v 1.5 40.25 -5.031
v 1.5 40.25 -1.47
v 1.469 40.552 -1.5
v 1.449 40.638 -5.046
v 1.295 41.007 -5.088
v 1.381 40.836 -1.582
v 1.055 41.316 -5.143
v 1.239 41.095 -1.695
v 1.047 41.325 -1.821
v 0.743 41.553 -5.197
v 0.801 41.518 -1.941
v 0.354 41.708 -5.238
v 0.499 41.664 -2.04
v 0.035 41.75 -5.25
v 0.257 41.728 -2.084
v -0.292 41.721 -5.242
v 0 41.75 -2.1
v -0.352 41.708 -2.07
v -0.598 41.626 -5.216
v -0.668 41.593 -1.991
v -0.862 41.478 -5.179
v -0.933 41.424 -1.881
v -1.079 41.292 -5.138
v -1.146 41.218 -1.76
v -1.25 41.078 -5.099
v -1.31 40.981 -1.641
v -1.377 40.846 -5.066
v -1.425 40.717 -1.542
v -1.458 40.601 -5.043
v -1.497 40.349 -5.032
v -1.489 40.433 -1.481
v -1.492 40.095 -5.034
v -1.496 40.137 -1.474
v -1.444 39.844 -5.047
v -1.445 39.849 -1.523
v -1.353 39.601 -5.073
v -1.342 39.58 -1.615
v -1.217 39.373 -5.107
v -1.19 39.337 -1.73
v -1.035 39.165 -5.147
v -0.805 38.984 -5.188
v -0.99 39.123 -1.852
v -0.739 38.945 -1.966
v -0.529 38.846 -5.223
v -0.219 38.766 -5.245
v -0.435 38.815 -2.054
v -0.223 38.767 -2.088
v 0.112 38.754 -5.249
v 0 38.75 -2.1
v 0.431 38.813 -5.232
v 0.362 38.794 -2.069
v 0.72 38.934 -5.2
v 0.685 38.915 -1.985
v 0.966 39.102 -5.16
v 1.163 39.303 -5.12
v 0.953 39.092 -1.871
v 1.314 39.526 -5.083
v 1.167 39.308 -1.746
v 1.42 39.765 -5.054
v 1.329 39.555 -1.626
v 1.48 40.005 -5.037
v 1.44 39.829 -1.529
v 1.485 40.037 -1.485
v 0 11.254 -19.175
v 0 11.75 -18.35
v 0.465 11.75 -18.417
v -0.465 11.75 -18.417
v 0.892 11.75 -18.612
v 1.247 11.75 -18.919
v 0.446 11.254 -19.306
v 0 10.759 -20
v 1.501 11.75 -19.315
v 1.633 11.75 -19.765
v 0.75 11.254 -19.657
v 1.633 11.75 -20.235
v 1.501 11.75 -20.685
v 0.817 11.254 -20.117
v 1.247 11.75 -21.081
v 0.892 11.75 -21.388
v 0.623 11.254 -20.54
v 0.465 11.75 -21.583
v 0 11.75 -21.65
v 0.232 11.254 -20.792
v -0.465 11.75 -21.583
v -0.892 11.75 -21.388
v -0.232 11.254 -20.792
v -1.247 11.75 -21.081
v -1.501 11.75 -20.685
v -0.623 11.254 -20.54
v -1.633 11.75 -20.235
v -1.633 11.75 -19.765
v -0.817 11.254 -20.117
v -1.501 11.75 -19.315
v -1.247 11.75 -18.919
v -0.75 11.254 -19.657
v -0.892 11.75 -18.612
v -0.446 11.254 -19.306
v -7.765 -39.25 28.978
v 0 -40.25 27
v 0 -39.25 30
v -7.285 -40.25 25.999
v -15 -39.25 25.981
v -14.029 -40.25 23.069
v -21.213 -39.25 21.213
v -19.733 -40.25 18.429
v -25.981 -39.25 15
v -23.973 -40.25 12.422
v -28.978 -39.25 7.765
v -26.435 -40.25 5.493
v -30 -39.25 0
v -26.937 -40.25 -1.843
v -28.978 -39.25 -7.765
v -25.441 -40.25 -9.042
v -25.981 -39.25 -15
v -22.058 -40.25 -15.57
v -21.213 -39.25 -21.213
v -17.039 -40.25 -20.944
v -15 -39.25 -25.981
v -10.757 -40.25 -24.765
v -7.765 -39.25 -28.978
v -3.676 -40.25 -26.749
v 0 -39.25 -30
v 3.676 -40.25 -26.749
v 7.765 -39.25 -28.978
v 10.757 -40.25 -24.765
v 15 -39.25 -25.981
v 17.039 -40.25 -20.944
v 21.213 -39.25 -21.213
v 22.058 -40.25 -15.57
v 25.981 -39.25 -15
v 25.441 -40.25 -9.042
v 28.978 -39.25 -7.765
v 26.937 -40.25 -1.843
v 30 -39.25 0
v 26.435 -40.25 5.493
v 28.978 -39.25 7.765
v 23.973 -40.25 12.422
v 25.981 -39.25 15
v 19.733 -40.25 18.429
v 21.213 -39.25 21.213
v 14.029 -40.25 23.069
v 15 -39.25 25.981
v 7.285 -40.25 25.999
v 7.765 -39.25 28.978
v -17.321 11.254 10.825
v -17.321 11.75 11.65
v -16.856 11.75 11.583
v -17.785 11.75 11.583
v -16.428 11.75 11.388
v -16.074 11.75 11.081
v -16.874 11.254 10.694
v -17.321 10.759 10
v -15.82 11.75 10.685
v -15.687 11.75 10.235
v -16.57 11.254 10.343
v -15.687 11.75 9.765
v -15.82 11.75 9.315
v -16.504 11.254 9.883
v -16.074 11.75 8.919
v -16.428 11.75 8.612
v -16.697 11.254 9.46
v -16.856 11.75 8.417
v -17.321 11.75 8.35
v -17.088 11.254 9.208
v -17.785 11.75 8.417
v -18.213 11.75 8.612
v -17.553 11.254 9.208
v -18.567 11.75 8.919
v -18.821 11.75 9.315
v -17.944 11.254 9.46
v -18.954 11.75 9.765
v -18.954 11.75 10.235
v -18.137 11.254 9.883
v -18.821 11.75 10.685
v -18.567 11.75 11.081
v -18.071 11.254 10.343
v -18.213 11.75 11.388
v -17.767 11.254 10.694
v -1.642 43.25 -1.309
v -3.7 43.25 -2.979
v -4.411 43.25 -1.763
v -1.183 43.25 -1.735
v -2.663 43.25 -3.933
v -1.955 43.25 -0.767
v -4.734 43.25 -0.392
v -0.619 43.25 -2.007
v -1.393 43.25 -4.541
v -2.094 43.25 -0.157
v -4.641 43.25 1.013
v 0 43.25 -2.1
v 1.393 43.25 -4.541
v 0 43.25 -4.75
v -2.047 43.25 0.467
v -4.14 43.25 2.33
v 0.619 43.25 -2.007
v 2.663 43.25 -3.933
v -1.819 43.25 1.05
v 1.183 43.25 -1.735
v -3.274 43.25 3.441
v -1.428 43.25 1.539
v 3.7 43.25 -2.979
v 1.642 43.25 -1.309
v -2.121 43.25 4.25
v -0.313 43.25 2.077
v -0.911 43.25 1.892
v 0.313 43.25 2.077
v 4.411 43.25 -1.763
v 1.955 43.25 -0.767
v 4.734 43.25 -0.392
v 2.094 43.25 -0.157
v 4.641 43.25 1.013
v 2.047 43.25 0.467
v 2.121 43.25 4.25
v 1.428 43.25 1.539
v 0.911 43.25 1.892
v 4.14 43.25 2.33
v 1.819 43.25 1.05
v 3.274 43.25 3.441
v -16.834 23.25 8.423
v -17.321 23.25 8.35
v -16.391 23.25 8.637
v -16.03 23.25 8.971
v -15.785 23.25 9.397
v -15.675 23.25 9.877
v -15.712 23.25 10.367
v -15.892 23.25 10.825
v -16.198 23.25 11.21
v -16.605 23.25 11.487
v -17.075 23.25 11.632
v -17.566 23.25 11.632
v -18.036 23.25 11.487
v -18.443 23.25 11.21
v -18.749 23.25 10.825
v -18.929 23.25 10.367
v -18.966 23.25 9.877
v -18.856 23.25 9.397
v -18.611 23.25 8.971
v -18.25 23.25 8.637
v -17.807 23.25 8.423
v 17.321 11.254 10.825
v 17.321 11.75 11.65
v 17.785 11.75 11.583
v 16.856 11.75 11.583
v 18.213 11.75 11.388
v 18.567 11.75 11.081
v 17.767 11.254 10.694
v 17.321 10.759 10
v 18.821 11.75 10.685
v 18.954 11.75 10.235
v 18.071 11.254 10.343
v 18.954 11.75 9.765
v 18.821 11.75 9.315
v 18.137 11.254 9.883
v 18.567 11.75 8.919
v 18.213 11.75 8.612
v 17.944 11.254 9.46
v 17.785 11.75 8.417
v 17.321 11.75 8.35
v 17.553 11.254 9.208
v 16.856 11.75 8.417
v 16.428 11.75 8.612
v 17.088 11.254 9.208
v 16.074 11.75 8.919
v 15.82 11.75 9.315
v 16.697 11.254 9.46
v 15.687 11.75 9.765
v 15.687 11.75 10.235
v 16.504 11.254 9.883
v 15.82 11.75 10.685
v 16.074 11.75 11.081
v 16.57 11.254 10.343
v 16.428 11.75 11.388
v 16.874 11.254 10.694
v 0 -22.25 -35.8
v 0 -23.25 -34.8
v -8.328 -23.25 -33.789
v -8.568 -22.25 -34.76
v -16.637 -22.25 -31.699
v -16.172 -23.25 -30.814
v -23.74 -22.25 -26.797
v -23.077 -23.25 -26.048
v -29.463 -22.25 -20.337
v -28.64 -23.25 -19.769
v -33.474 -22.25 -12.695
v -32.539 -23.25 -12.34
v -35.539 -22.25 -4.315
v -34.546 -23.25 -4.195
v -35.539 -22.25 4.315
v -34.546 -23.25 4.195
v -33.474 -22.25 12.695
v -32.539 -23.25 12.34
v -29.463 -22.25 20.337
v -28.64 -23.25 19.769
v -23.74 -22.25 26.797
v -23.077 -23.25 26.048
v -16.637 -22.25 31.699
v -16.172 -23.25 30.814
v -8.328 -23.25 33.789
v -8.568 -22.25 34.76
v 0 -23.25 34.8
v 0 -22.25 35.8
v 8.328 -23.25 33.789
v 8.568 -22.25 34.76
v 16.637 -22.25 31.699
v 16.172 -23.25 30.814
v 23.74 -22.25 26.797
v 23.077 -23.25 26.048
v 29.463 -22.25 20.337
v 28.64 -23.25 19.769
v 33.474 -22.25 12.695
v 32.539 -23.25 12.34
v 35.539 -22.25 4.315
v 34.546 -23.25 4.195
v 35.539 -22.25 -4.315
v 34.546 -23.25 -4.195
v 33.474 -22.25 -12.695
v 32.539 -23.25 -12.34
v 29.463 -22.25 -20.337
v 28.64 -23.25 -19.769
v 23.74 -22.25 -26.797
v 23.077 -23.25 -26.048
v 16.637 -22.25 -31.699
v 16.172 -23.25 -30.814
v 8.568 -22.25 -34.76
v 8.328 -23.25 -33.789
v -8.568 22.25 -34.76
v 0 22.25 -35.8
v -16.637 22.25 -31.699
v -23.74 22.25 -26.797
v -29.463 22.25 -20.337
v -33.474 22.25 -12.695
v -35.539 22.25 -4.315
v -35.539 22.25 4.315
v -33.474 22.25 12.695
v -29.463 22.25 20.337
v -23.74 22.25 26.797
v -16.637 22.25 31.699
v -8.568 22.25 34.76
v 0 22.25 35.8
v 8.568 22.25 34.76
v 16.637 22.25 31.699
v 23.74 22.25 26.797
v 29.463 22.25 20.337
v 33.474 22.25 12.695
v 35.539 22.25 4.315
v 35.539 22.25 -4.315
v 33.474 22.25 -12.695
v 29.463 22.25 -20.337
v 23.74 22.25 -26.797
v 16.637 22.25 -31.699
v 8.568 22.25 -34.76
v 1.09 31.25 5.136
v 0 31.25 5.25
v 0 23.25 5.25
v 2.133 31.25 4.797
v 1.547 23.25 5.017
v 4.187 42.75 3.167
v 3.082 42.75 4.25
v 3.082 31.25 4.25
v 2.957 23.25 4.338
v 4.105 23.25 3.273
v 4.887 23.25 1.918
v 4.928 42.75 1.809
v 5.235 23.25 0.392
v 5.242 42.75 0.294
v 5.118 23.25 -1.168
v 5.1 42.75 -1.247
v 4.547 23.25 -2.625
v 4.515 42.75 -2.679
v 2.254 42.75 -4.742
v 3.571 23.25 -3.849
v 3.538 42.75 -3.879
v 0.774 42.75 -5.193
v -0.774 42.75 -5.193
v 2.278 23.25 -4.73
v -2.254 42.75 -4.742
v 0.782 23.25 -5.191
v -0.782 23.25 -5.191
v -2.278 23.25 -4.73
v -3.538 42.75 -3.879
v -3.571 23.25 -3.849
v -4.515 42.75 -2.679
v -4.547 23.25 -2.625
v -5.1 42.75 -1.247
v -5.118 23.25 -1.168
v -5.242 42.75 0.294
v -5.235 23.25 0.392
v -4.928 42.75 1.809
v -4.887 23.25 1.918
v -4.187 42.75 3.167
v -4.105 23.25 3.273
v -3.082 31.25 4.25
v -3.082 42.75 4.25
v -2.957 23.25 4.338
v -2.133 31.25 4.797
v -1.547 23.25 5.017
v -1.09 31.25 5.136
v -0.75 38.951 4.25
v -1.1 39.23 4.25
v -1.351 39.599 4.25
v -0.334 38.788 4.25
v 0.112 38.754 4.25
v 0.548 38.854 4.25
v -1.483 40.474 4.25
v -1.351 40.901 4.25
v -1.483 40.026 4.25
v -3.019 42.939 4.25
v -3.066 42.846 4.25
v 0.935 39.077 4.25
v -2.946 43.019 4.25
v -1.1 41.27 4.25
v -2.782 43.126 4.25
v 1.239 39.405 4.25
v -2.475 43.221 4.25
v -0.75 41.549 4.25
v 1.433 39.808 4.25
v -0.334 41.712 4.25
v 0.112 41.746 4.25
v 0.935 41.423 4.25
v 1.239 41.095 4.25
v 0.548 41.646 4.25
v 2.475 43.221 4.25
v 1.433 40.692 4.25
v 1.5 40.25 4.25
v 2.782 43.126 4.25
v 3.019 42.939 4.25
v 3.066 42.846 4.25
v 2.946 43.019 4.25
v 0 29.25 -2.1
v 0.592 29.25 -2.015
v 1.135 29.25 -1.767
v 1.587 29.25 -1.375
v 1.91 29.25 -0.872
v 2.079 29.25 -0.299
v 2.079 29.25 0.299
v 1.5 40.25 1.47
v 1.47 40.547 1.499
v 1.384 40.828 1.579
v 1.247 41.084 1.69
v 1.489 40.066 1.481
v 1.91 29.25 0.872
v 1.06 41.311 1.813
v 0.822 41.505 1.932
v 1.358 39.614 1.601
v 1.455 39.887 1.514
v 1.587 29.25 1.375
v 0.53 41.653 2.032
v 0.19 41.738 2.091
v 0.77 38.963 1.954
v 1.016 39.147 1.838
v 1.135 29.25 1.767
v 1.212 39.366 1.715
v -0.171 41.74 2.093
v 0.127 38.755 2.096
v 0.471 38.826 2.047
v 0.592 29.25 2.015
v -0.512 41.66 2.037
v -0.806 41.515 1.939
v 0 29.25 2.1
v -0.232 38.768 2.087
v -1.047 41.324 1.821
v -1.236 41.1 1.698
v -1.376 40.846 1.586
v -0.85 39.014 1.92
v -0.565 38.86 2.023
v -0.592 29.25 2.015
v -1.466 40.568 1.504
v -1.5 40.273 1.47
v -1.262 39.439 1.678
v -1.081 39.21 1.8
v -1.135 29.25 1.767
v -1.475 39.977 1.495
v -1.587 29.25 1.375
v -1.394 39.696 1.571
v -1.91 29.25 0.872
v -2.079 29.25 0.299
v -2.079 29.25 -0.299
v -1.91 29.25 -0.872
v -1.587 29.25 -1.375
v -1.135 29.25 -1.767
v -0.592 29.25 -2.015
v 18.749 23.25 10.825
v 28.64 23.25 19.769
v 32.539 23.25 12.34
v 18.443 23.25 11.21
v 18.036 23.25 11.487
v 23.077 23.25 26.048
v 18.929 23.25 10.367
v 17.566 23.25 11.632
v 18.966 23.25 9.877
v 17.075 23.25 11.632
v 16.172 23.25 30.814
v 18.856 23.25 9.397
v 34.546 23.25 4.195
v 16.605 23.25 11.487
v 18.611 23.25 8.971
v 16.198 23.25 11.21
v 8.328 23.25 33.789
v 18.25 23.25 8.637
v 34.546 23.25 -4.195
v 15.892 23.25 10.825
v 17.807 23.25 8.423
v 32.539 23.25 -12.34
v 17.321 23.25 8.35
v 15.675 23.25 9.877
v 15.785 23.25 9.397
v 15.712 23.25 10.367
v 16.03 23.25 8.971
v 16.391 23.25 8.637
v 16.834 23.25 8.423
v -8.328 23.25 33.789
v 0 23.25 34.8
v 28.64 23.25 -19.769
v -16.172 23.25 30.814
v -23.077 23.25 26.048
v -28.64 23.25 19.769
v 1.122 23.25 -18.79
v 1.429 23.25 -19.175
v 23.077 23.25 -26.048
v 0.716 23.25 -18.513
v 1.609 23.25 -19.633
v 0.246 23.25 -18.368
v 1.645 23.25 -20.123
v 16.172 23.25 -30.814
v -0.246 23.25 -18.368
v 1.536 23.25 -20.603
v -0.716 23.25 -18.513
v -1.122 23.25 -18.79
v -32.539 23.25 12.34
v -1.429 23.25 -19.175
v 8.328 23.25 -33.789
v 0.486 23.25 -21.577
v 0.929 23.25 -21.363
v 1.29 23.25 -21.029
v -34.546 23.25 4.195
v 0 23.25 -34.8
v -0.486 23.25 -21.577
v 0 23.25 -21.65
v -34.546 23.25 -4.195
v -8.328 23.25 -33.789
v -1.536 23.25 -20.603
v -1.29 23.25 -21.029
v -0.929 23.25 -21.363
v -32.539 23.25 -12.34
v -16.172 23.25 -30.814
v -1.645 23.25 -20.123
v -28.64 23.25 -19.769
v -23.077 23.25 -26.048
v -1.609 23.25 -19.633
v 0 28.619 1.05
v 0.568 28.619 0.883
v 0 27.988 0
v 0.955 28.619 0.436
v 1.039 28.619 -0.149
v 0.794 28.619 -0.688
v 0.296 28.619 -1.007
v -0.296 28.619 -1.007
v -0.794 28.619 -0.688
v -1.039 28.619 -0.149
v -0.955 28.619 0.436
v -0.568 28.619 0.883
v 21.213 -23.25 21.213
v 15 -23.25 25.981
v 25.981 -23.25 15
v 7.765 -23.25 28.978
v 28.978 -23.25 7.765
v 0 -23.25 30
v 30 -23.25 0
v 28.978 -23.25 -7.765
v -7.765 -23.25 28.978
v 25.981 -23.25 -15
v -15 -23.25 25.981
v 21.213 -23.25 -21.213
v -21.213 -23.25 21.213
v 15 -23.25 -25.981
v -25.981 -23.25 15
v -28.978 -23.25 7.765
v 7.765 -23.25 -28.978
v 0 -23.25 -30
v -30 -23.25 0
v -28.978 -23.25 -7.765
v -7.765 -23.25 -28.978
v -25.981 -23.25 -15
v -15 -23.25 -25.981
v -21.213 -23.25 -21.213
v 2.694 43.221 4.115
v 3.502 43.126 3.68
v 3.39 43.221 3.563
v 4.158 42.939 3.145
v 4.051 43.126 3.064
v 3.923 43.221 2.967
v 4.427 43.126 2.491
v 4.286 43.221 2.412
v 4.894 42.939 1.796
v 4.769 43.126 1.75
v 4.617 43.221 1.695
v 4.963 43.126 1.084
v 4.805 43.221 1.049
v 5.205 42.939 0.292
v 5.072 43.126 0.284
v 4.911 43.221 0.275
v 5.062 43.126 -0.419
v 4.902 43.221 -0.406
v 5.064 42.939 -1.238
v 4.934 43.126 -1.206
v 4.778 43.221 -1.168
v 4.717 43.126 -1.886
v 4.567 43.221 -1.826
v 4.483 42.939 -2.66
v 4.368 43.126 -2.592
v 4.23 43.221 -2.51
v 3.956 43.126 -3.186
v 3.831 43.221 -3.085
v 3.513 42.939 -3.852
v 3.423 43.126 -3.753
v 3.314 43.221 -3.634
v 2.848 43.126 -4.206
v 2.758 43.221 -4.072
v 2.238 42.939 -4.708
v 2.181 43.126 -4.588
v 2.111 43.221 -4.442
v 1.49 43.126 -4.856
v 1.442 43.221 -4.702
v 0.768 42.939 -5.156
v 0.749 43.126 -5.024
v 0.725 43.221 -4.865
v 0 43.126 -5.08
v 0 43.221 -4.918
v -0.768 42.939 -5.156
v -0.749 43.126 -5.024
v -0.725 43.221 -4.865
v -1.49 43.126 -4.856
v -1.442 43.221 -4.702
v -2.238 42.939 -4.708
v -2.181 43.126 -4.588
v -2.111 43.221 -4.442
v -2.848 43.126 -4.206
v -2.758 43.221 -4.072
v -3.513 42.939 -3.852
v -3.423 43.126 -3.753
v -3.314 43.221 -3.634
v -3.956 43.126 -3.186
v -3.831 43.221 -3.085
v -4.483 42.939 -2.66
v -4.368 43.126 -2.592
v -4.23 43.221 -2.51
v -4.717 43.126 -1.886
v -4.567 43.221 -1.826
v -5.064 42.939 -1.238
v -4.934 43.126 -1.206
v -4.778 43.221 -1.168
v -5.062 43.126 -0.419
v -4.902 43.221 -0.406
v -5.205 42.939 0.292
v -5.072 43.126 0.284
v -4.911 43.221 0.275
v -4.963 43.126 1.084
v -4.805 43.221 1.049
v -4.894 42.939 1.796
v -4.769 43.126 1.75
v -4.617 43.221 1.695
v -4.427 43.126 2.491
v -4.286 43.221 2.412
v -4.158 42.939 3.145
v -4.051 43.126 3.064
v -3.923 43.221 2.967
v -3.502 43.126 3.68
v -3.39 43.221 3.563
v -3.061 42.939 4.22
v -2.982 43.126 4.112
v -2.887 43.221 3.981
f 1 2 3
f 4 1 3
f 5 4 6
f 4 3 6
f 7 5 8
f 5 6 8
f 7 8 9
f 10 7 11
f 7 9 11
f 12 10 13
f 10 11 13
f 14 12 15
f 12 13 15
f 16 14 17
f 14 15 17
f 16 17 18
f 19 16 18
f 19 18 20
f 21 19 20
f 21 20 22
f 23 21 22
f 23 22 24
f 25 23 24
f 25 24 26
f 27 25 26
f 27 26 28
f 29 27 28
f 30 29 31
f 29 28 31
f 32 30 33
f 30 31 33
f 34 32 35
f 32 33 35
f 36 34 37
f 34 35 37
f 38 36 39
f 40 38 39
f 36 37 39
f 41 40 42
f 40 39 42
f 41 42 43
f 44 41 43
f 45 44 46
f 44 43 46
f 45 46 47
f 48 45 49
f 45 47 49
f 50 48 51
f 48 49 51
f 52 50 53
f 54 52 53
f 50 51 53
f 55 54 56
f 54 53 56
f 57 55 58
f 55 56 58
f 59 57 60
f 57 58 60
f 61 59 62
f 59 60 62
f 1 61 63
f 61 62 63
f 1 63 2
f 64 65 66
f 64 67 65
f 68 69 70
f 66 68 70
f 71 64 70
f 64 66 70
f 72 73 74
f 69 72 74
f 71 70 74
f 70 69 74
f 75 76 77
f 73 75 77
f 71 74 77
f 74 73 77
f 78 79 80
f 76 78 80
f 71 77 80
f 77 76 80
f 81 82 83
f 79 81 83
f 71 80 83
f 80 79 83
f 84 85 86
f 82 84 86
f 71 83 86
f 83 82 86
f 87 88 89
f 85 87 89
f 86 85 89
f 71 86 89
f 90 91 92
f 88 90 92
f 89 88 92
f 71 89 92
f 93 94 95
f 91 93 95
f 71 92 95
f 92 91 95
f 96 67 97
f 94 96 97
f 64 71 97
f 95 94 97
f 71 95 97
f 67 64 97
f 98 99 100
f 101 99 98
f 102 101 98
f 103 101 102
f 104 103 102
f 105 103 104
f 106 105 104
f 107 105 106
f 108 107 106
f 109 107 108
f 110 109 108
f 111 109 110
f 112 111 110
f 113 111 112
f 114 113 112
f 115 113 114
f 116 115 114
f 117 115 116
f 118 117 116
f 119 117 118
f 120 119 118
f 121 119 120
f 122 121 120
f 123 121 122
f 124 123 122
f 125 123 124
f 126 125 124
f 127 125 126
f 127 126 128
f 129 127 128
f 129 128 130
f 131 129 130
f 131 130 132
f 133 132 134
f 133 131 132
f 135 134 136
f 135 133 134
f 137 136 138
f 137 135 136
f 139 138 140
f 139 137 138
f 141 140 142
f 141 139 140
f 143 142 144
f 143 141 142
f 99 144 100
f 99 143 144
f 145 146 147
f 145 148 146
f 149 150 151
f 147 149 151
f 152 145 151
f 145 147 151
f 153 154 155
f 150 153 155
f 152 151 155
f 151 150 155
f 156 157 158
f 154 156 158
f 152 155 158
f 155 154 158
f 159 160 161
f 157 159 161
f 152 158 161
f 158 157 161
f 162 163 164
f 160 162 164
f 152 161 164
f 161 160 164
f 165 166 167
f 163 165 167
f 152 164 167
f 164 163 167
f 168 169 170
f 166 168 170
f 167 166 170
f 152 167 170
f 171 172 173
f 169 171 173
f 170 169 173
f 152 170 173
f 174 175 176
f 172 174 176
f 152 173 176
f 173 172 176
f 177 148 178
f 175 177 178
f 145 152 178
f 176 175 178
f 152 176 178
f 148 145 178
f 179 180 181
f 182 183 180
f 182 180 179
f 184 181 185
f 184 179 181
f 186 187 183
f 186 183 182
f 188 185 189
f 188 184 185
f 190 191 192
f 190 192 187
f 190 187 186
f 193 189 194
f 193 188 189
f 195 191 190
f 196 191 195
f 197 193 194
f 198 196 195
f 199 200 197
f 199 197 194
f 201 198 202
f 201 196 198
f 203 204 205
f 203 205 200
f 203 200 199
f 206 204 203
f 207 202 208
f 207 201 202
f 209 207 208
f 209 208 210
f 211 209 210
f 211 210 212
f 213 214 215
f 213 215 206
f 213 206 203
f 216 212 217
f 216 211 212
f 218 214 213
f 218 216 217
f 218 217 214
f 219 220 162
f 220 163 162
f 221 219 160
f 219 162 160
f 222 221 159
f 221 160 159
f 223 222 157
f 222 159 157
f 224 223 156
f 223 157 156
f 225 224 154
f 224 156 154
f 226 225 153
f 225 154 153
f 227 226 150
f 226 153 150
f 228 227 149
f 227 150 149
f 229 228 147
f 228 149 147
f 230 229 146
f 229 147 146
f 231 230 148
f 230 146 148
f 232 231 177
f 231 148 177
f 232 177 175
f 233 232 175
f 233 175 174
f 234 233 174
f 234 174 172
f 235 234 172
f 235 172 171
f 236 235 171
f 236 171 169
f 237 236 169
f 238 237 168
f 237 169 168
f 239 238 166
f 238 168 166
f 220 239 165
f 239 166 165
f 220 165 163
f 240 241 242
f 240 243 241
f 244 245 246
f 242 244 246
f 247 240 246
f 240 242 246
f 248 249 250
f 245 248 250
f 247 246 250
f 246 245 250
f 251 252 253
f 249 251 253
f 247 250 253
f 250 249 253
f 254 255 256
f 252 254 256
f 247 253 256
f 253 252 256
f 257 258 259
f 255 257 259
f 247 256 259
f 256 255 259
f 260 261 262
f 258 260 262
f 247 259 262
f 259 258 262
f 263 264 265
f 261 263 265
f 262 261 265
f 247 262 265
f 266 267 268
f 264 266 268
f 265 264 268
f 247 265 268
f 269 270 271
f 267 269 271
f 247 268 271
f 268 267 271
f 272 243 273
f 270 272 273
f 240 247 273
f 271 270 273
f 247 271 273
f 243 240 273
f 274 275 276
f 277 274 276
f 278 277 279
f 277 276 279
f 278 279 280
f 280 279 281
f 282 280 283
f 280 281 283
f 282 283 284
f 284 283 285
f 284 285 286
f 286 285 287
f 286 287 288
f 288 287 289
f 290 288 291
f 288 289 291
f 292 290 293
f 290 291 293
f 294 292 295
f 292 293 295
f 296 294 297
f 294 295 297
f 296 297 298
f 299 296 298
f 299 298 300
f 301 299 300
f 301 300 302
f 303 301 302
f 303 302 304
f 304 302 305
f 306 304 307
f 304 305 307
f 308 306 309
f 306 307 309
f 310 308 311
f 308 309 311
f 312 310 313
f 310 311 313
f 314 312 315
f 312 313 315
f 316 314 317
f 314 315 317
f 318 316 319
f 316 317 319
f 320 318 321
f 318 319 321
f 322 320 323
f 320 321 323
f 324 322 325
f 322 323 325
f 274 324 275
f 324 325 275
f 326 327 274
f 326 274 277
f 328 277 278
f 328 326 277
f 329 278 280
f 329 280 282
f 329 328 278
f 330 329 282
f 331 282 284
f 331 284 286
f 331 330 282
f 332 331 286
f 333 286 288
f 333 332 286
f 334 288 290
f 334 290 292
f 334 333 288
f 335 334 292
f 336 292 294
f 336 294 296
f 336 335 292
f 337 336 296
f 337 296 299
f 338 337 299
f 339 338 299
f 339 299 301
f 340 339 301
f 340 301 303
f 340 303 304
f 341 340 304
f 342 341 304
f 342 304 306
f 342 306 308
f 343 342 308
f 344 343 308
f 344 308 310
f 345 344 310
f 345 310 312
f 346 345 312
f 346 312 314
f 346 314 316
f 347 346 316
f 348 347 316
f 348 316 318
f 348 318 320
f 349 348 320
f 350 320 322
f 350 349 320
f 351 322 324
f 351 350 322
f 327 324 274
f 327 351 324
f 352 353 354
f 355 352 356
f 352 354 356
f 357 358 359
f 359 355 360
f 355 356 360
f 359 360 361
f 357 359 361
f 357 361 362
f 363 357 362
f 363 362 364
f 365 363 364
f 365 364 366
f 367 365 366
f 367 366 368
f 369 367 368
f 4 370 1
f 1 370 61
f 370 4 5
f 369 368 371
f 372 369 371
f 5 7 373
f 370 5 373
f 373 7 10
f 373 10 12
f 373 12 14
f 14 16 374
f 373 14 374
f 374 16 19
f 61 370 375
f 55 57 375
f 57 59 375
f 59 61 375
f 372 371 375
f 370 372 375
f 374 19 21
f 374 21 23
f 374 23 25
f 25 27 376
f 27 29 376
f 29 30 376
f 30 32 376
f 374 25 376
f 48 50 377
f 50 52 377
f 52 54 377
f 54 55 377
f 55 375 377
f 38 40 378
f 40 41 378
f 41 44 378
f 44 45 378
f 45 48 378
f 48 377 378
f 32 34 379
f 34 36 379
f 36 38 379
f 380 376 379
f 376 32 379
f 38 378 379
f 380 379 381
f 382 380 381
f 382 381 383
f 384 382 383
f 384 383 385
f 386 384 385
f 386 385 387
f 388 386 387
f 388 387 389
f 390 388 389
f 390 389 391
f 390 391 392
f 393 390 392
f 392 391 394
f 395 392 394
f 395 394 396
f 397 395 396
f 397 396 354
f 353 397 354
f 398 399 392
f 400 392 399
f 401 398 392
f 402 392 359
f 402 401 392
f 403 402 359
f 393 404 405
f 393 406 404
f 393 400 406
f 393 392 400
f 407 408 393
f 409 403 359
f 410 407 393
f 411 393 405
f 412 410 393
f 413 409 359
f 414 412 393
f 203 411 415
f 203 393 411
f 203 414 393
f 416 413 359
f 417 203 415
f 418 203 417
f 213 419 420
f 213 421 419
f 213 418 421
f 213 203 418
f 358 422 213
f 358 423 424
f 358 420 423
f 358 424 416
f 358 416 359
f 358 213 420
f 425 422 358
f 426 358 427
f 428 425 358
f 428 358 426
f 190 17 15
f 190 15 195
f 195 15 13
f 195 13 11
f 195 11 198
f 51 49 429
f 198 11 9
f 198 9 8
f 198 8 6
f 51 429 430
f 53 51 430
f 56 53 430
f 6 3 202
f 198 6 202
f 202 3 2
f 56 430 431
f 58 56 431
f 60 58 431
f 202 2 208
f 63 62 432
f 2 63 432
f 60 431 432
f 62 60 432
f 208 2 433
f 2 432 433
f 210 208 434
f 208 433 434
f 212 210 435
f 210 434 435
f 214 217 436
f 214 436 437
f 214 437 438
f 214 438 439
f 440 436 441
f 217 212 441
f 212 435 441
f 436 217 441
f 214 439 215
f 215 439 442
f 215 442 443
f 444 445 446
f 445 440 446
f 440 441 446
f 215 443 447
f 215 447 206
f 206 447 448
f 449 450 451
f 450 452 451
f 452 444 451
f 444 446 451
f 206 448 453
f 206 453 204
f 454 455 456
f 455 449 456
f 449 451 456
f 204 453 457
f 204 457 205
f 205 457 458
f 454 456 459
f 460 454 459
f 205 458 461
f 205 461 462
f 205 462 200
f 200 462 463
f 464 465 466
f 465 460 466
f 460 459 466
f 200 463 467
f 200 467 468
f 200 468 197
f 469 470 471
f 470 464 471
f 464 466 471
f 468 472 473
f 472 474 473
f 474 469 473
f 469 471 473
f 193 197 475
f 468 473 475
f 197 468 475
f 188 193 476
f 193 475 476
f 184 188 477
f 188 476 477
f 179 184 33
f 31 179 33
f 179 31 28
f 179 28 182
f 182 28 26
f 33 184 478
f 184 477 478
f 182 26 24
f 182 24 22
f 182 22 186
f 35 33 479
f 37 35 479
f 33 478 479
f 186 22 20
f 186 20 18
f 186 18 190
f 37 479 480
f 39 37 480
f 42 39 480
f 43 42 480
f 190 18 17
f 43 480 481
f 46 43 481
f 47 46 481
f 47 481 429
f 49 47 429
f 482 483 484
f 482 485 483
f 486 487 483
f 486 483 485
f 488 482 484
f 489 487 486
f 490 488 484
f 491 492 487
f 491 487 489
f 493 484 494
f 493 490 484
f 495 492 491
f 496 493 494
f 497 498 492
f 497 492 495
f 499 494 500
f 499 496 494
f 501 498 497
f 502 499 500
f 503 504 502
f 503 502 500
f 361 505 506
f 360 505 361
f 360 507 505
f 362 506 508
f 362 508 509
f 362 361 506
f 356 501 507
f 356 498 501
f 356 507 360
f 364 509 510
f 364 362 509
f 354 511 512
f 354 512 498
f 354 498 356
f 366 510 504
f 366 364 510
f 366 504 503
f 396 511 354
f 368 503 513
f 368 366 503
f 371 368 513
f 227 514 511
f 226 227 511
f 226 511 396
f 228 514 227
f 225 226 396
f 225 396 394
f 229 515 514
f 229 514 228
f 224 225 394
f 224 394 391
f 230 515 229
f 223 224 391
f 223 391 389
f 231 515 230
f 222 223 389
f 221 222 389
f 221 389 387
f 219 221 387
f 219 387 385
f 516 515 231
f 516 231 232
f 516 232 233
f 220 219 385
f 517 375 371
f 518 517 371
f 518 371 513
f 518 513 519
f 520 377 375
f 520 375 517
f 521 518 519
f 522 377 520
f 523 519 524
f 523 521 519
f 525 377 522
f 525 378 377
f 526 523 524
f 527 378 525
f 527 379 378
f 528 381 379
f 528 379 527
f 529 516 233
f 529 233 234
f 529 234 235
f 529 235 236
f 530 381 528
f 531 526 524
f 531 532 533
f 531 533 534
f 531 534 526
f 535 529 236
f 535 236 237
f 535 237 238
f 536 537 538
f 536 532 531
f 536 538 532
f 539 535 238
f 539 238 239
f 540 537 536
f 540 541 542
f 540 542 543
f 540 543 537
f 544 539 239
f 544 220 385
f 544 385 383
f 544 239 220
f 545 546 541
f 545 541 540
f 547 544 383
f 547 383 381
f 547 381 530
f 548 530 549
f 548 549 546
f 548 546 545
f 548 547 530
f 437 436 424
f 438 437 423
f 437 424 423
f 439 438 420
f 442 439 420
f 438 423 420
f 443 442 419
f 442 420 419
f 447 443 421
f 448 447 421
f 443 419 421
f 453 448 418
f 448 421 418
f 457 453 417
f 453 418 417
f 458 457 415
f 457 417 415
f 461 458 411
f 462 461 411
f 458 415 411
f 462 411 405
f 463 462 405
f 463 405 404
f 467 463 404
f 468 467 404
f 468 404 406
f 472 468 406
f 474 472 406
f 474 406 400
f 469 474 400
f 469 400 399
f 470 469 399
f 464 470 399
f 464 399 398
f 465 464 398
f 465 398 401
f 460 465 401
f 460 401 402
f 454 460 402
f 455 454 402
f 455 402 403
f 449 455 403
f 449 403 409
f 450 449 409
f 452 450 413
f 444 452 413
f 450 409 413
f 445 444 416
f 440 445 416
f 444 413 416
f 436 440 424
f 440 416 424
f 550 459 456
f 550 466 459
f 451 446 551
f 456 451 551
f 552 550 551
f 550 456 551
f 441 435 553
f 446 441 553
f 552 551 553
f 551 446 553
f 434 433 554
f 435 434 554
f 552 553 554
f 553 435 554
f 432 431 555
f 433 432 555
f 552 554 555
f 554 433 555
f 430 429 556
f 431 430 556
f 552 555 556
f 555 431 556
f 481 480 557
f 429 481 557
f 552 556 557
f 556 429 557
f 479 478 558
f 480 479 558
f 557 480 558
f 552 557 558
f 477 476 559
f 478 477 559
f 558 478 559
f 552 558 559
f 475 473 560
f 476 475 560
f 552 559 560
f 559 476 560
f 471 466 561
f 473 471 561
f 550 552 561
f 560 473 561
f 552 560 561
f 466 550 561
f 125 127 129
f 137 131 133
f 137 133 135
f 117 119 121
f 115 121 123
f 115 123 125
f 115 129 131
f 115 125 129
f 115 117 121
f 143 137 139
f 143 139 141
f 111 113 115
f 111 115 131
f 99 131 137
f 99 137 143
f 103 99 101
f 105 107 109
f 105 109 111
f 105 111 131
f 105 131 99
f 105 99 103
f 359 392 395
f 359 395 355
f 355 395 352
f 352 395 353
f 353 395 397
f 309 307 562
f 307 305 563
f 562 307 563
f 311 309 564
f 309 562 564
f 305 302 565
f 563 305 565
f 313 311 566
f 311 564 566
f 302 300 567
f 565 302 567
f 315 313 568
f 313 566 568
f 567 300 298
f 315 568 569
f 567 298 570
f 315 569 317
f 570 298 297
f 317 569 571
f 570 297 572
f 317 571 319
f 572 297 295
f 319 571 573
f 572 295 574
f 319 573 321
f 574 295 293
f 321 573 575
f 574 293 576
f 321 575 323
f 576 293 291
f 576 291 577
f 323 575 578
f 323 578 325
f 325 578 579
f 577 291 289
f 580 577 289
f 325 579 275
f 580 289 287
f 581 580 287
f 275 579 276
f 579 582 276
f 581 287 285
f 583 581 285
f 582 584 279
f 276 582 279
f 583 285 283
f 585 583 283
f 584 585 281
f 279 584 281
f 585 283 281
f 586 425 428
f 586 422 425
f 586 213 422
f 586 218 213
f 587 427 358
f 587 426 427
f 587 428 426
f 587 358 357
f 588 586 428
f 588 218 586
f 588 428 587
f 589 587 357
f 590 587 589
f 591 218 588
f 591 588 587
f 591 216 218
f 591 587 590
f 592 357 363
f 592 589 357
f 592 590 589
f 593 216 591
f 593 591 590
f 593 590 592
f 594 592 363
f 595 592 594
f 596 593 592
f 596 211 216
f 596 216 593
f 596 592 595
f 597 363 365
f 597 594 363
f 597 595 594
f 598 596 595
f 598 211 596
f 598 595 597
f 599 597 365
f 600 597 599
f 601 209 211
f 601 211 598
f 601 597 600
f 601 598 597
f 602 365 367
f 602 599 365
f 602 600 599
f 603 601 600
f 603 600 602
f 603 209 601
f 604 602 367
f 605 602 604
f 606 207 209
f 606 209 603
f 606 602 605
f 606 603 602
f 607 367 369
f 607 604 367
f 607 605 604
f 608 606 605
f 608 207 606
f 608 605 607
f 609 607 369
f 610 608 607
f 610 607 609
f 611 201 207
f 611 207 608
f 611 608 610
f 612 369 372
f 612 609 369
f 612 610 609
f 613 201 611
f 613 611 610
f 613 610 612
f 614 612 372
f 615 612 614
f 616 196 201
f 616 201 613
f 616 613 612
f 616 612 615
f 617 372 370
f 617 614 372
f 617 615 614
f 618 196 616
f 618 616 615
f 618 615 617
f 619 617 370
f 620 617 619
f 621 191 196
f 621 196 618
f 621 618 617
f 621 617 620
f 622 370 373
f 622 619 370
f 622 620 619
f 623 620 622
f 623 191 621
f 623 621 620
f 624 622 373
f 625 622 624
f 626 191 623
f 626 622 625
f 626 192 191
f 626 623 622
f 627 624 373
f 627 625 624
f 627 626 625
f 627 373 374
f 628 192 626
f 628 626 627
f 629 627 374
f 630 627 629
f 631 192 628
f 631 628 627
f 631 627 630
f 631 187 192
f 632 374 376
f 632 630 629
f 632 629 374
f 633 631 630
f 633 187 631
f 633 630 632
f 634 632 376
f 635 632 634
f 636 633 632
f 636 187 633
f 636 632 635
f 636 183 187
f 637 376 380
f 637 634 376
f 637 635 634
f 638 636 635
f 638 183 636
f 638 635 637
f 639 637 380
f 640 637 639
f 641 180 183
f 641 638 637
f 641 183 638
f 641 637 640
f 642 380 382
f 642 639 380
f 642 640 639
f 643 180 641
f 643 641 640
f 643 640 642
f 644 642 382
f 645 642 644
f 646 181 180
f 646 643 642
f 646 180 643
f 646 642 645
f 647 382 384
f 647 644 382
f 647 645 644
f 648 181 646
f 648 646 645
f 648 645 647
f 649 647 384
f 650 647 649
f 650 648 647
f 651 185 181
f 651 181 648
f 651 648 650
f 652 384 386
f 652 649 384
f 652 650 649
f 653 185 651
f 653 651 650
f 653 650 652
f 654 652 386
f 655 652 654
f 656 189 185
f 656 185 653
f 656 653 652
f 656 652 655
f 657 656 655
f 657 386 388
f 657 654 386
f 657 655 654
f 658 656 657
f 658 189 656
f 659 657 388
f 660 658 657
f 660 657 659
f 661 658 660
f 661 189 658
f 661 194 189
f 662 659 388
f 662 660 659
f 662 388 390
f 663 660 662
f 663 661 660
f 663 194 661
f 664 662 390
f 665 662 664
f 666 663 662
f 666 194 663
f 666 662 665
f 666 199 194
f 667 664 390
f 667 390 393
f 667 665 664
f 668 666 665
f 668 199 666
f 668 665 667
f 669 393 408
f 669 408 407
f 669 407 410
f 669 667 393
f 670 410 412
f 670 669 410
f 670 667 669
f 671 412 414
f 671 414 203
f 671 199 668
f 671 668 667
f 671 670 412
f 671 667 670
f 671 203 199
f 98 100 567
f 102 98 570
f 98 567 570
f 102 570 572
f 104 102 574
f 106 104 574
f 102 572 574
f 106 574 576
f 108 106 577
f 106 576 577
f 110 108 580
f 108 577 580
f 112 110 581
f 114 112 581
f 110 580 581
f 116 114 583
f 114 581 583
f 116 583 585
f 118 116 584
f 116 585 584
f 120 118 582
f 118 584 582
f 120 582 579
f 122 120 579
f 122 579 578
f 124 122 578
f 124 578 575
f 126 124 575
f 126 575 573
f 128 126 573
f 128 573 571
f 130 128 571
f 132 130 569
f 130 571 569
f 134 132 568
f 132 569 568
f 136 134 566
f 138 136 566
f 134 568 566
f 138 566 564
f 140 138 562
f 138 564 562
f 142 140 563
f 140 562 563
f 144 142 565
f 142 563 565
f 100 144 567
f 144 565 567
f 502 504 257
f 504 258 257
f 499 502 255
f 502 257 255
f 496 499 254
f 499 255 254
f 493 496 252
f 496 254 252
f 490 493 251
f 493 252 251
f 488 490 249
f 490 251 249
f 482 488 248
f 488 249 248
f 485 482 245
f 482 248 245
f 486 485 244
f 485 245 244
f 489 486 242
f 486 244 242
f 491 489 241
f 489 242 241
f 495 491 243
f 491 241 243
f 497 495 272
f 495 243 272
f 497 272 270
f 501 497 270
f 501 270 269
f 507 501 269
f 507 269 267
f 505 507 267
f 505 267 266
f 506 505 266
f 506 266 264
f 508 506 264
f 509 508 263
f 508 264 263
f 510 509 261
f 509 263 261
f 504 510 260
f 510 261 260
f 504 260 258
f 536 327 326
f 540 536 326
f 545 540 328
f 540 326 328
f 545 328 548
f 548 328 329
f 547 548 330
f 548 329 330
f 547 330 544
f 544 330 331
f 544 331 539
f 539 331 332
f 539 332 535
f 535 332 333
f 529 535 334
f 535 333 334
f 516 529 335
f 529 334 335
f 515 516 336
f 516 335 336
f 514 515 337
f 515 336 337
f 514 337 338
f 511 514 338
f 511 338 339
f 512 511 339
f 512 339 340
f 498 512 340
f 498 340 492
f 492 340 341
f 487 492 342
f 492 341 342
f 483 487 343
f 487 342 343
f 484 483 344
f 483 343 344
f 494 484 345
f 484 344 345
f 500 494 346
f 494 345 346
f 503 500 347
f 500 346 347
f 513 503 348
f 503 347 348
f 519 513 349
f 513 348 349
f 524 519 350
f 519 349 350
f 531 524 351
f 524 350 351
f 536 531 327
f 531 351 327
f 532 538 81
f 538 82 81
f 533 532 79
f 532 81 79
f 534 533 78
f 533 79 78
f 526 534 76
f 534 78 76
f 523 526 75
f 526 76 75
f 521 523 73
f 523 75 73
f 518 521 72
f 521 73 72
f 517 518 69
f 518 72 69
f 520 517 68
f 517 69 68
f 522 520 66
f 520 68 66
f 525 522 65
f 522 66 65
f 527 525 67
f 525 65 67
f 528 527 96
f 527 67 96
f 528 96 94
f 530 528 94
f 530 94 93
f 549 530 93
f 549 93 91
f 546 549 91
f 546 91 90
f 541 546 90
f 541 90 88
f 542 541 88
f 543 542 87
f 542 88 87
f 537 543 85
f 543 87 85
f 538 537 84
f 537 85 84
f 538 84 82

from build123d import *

# Parameters (mm, degrees)
SKETCH_1_R             = 35.8
EXTRUDE_1_DEPTH        = 23.25
HOLE_WIZARD_M4_1_D     = 3.3
HOLE_WIZARD_M4_1_DEPTH = 11.5
HOLE_WIZARD_M4_1_TIP   = 0.991420021
SKETCH_4_R             = 5.25
EXTRUDE_2_DEPTH        = 20
FILLET_1_R             = 0.5
SKETCH_5_W             = 9.627947462
SKETCH_5_H             = 2
CUT_EXTRUDE_1_DEPTH    = 12
HOLE_WIZARD_M5_1_D     = 4.2
HOLE_WIZARD_M5_1_DEPTH = 14
HOLE_WIZARD_M5_1_TIP   = 1.2618073
CHAMFER_1_SIZE         = 1
SKETCH_7_R             = 30
EXTRUDE_3_DEPTH        = 17
CHAMFER_2_SIZE         = 1
CHAMFER_3_SIZE         = 1
CHAMFER_3_SIZE2        = 3
SKETCH_8_R             = 1.5
CUT_EXTRUDE_2_DEPTH    = 69.965244933


with BuildPart() as part:
    # 草图1 → 凸台-拉伸1 (new, symmetric)
    with BuildSketch(Plane(origin=(0, 0, 0), x_dir=(1, 0, 0), z_dir=(0, 1, 0))):
        with Locations(Location((0, 0, 0), (0, 0, 90))):
            Circle(SKETCH_1_R)
    extrude(amount=EXTRUDE_1_DEPTH, both=True)

    # M4 螺纹孔1
    with Locations(Plane(origin=(0, 23.25, -20), x_dir=(0, 0, 1), z_dir=(0, 1, 0))):
        with Locations((0, 0), (30, -17.320508076), (30, 17.320508076)):
            Hole(HOLE_WIZARD_M4_1_D / 2, depth=HOLE_WIZARD_M4_1_DEPTH)
            with Locations((0, 0, -(HOLE_WIZARD_M4_1_DEPTH + HOLE_WIZARD_M4_1_TIP / 2))):  # 118° drill point
                Cone(0, HOLE_WIZARD_M4_1_D / 2, HOLE_WIZARD_M4_1_TIP, mode=Mode.SUBTRACT)

    # 草图4 → 凸台-拉伸2 (add)
    with BuildSketch(Plane(origin=(0, 23.25, 0), x_dir=(1, 0, 0), z_dir=(0, 1, 0))):
        with Locations(Location((0, 0, 0), (0, 0, 270))):
            Circle(SKETCH_4_R)
    extrude(amount=EXTRUDE_2_DEPTH)

    # 圆角1
    fillet_1_edges = [part.edges().sort_by_distance(p)[0] for p in [
        (0, 43.25, -5.25),
    ]]
    fillet(fillet_1_edges, radius=FILLET_1_R)

    # 草图5 → 切除-拉伸1 (cut)
    with BuildSketch(Plane(origin=(0, 43.25, 0), x_dir=(1, 0, 0), z_dir=(0, 1, 0))):
        with Locations((0, -5.25)):
            Rectangle(SKETCH_5_W, SKETCH_5_H)
    extrude(amount=-CUT_EXTRUDE_1_DEPTH, mode=Mode.SUBTRACT)

    # M5 螺纹孔1
    with Locations(Plane.ZX.offset(43.25)):
        with Locations((0, 0)):
            Hole(HOLE_WIZARD_M5_1_D / 2, depth=HOLE_WIZARD_M5_1_DEPTH)
            with Locations((0, 0, -(HOLE_WIZARD_M5_1_DEPTH + HOLE_WIZARD_M5_1_TIP / 2))):  # 118° drill point
                Cone(0, HOLE_WIZARD_M5_1_D / 2, HOLE_WIZARD_M5_1_TIP, mode=Mode.SUBTRACT)

    # 倒角1
    chamfer_1_edges = [part.edges().sort_by_distance(p)[0] for p in [
        (0, 23.25, 35.8),
    ]]
    chamfer(chamfer_1_edges, length=CHAMFER_1_SIZE)

    # 草图7 → 凸台-拉伸3 (add)
    with BuildSketch(Plane.XZ.offset(23.25)):
        with Locations(Location((0, 0, 0), (0, 0, 90))):
            Circle(SKETCH_7_R)
    extrude(amount=EXTRUDE_3_DEPTH)

    # 倒角2
    chamfer_2_edges = [part.edges().sort_by_distance(p)[0] for p in [
        (0, -23.25, 35.8),
    ]]
    chamfer(chamfer_2_edges, length=CHAMFER_2_SIZE)

    # 倒角3
    chamfer_3_edges = [part.edges().sort_by_distance(p)[0] for p in [
        (0, -40.25, -30),
    ]]
    chamfer_3_side = [part.faces().sort_by_distance(p)[0] for p in [
        (0, -31.75, -30),
    ]]
    chamfer(chamfer_3_edges, length=CHAMFER_3_SIZE, length2=CHAMFER_3_SIZE2, reference=chamfer_3_side[0])

    # 草图8 → 切除-拉伸2 (cut, through all)
    with BuildSketch(Plane.XY.offset(4.25)):
        with Locations((0, 40.25)):
            Circle(SKETCH_8_R)
    extrude(amount=-CUT_EXTRUDE_2_DEPTH, mode=Mode.SUBTRACT)


solid = part.part
